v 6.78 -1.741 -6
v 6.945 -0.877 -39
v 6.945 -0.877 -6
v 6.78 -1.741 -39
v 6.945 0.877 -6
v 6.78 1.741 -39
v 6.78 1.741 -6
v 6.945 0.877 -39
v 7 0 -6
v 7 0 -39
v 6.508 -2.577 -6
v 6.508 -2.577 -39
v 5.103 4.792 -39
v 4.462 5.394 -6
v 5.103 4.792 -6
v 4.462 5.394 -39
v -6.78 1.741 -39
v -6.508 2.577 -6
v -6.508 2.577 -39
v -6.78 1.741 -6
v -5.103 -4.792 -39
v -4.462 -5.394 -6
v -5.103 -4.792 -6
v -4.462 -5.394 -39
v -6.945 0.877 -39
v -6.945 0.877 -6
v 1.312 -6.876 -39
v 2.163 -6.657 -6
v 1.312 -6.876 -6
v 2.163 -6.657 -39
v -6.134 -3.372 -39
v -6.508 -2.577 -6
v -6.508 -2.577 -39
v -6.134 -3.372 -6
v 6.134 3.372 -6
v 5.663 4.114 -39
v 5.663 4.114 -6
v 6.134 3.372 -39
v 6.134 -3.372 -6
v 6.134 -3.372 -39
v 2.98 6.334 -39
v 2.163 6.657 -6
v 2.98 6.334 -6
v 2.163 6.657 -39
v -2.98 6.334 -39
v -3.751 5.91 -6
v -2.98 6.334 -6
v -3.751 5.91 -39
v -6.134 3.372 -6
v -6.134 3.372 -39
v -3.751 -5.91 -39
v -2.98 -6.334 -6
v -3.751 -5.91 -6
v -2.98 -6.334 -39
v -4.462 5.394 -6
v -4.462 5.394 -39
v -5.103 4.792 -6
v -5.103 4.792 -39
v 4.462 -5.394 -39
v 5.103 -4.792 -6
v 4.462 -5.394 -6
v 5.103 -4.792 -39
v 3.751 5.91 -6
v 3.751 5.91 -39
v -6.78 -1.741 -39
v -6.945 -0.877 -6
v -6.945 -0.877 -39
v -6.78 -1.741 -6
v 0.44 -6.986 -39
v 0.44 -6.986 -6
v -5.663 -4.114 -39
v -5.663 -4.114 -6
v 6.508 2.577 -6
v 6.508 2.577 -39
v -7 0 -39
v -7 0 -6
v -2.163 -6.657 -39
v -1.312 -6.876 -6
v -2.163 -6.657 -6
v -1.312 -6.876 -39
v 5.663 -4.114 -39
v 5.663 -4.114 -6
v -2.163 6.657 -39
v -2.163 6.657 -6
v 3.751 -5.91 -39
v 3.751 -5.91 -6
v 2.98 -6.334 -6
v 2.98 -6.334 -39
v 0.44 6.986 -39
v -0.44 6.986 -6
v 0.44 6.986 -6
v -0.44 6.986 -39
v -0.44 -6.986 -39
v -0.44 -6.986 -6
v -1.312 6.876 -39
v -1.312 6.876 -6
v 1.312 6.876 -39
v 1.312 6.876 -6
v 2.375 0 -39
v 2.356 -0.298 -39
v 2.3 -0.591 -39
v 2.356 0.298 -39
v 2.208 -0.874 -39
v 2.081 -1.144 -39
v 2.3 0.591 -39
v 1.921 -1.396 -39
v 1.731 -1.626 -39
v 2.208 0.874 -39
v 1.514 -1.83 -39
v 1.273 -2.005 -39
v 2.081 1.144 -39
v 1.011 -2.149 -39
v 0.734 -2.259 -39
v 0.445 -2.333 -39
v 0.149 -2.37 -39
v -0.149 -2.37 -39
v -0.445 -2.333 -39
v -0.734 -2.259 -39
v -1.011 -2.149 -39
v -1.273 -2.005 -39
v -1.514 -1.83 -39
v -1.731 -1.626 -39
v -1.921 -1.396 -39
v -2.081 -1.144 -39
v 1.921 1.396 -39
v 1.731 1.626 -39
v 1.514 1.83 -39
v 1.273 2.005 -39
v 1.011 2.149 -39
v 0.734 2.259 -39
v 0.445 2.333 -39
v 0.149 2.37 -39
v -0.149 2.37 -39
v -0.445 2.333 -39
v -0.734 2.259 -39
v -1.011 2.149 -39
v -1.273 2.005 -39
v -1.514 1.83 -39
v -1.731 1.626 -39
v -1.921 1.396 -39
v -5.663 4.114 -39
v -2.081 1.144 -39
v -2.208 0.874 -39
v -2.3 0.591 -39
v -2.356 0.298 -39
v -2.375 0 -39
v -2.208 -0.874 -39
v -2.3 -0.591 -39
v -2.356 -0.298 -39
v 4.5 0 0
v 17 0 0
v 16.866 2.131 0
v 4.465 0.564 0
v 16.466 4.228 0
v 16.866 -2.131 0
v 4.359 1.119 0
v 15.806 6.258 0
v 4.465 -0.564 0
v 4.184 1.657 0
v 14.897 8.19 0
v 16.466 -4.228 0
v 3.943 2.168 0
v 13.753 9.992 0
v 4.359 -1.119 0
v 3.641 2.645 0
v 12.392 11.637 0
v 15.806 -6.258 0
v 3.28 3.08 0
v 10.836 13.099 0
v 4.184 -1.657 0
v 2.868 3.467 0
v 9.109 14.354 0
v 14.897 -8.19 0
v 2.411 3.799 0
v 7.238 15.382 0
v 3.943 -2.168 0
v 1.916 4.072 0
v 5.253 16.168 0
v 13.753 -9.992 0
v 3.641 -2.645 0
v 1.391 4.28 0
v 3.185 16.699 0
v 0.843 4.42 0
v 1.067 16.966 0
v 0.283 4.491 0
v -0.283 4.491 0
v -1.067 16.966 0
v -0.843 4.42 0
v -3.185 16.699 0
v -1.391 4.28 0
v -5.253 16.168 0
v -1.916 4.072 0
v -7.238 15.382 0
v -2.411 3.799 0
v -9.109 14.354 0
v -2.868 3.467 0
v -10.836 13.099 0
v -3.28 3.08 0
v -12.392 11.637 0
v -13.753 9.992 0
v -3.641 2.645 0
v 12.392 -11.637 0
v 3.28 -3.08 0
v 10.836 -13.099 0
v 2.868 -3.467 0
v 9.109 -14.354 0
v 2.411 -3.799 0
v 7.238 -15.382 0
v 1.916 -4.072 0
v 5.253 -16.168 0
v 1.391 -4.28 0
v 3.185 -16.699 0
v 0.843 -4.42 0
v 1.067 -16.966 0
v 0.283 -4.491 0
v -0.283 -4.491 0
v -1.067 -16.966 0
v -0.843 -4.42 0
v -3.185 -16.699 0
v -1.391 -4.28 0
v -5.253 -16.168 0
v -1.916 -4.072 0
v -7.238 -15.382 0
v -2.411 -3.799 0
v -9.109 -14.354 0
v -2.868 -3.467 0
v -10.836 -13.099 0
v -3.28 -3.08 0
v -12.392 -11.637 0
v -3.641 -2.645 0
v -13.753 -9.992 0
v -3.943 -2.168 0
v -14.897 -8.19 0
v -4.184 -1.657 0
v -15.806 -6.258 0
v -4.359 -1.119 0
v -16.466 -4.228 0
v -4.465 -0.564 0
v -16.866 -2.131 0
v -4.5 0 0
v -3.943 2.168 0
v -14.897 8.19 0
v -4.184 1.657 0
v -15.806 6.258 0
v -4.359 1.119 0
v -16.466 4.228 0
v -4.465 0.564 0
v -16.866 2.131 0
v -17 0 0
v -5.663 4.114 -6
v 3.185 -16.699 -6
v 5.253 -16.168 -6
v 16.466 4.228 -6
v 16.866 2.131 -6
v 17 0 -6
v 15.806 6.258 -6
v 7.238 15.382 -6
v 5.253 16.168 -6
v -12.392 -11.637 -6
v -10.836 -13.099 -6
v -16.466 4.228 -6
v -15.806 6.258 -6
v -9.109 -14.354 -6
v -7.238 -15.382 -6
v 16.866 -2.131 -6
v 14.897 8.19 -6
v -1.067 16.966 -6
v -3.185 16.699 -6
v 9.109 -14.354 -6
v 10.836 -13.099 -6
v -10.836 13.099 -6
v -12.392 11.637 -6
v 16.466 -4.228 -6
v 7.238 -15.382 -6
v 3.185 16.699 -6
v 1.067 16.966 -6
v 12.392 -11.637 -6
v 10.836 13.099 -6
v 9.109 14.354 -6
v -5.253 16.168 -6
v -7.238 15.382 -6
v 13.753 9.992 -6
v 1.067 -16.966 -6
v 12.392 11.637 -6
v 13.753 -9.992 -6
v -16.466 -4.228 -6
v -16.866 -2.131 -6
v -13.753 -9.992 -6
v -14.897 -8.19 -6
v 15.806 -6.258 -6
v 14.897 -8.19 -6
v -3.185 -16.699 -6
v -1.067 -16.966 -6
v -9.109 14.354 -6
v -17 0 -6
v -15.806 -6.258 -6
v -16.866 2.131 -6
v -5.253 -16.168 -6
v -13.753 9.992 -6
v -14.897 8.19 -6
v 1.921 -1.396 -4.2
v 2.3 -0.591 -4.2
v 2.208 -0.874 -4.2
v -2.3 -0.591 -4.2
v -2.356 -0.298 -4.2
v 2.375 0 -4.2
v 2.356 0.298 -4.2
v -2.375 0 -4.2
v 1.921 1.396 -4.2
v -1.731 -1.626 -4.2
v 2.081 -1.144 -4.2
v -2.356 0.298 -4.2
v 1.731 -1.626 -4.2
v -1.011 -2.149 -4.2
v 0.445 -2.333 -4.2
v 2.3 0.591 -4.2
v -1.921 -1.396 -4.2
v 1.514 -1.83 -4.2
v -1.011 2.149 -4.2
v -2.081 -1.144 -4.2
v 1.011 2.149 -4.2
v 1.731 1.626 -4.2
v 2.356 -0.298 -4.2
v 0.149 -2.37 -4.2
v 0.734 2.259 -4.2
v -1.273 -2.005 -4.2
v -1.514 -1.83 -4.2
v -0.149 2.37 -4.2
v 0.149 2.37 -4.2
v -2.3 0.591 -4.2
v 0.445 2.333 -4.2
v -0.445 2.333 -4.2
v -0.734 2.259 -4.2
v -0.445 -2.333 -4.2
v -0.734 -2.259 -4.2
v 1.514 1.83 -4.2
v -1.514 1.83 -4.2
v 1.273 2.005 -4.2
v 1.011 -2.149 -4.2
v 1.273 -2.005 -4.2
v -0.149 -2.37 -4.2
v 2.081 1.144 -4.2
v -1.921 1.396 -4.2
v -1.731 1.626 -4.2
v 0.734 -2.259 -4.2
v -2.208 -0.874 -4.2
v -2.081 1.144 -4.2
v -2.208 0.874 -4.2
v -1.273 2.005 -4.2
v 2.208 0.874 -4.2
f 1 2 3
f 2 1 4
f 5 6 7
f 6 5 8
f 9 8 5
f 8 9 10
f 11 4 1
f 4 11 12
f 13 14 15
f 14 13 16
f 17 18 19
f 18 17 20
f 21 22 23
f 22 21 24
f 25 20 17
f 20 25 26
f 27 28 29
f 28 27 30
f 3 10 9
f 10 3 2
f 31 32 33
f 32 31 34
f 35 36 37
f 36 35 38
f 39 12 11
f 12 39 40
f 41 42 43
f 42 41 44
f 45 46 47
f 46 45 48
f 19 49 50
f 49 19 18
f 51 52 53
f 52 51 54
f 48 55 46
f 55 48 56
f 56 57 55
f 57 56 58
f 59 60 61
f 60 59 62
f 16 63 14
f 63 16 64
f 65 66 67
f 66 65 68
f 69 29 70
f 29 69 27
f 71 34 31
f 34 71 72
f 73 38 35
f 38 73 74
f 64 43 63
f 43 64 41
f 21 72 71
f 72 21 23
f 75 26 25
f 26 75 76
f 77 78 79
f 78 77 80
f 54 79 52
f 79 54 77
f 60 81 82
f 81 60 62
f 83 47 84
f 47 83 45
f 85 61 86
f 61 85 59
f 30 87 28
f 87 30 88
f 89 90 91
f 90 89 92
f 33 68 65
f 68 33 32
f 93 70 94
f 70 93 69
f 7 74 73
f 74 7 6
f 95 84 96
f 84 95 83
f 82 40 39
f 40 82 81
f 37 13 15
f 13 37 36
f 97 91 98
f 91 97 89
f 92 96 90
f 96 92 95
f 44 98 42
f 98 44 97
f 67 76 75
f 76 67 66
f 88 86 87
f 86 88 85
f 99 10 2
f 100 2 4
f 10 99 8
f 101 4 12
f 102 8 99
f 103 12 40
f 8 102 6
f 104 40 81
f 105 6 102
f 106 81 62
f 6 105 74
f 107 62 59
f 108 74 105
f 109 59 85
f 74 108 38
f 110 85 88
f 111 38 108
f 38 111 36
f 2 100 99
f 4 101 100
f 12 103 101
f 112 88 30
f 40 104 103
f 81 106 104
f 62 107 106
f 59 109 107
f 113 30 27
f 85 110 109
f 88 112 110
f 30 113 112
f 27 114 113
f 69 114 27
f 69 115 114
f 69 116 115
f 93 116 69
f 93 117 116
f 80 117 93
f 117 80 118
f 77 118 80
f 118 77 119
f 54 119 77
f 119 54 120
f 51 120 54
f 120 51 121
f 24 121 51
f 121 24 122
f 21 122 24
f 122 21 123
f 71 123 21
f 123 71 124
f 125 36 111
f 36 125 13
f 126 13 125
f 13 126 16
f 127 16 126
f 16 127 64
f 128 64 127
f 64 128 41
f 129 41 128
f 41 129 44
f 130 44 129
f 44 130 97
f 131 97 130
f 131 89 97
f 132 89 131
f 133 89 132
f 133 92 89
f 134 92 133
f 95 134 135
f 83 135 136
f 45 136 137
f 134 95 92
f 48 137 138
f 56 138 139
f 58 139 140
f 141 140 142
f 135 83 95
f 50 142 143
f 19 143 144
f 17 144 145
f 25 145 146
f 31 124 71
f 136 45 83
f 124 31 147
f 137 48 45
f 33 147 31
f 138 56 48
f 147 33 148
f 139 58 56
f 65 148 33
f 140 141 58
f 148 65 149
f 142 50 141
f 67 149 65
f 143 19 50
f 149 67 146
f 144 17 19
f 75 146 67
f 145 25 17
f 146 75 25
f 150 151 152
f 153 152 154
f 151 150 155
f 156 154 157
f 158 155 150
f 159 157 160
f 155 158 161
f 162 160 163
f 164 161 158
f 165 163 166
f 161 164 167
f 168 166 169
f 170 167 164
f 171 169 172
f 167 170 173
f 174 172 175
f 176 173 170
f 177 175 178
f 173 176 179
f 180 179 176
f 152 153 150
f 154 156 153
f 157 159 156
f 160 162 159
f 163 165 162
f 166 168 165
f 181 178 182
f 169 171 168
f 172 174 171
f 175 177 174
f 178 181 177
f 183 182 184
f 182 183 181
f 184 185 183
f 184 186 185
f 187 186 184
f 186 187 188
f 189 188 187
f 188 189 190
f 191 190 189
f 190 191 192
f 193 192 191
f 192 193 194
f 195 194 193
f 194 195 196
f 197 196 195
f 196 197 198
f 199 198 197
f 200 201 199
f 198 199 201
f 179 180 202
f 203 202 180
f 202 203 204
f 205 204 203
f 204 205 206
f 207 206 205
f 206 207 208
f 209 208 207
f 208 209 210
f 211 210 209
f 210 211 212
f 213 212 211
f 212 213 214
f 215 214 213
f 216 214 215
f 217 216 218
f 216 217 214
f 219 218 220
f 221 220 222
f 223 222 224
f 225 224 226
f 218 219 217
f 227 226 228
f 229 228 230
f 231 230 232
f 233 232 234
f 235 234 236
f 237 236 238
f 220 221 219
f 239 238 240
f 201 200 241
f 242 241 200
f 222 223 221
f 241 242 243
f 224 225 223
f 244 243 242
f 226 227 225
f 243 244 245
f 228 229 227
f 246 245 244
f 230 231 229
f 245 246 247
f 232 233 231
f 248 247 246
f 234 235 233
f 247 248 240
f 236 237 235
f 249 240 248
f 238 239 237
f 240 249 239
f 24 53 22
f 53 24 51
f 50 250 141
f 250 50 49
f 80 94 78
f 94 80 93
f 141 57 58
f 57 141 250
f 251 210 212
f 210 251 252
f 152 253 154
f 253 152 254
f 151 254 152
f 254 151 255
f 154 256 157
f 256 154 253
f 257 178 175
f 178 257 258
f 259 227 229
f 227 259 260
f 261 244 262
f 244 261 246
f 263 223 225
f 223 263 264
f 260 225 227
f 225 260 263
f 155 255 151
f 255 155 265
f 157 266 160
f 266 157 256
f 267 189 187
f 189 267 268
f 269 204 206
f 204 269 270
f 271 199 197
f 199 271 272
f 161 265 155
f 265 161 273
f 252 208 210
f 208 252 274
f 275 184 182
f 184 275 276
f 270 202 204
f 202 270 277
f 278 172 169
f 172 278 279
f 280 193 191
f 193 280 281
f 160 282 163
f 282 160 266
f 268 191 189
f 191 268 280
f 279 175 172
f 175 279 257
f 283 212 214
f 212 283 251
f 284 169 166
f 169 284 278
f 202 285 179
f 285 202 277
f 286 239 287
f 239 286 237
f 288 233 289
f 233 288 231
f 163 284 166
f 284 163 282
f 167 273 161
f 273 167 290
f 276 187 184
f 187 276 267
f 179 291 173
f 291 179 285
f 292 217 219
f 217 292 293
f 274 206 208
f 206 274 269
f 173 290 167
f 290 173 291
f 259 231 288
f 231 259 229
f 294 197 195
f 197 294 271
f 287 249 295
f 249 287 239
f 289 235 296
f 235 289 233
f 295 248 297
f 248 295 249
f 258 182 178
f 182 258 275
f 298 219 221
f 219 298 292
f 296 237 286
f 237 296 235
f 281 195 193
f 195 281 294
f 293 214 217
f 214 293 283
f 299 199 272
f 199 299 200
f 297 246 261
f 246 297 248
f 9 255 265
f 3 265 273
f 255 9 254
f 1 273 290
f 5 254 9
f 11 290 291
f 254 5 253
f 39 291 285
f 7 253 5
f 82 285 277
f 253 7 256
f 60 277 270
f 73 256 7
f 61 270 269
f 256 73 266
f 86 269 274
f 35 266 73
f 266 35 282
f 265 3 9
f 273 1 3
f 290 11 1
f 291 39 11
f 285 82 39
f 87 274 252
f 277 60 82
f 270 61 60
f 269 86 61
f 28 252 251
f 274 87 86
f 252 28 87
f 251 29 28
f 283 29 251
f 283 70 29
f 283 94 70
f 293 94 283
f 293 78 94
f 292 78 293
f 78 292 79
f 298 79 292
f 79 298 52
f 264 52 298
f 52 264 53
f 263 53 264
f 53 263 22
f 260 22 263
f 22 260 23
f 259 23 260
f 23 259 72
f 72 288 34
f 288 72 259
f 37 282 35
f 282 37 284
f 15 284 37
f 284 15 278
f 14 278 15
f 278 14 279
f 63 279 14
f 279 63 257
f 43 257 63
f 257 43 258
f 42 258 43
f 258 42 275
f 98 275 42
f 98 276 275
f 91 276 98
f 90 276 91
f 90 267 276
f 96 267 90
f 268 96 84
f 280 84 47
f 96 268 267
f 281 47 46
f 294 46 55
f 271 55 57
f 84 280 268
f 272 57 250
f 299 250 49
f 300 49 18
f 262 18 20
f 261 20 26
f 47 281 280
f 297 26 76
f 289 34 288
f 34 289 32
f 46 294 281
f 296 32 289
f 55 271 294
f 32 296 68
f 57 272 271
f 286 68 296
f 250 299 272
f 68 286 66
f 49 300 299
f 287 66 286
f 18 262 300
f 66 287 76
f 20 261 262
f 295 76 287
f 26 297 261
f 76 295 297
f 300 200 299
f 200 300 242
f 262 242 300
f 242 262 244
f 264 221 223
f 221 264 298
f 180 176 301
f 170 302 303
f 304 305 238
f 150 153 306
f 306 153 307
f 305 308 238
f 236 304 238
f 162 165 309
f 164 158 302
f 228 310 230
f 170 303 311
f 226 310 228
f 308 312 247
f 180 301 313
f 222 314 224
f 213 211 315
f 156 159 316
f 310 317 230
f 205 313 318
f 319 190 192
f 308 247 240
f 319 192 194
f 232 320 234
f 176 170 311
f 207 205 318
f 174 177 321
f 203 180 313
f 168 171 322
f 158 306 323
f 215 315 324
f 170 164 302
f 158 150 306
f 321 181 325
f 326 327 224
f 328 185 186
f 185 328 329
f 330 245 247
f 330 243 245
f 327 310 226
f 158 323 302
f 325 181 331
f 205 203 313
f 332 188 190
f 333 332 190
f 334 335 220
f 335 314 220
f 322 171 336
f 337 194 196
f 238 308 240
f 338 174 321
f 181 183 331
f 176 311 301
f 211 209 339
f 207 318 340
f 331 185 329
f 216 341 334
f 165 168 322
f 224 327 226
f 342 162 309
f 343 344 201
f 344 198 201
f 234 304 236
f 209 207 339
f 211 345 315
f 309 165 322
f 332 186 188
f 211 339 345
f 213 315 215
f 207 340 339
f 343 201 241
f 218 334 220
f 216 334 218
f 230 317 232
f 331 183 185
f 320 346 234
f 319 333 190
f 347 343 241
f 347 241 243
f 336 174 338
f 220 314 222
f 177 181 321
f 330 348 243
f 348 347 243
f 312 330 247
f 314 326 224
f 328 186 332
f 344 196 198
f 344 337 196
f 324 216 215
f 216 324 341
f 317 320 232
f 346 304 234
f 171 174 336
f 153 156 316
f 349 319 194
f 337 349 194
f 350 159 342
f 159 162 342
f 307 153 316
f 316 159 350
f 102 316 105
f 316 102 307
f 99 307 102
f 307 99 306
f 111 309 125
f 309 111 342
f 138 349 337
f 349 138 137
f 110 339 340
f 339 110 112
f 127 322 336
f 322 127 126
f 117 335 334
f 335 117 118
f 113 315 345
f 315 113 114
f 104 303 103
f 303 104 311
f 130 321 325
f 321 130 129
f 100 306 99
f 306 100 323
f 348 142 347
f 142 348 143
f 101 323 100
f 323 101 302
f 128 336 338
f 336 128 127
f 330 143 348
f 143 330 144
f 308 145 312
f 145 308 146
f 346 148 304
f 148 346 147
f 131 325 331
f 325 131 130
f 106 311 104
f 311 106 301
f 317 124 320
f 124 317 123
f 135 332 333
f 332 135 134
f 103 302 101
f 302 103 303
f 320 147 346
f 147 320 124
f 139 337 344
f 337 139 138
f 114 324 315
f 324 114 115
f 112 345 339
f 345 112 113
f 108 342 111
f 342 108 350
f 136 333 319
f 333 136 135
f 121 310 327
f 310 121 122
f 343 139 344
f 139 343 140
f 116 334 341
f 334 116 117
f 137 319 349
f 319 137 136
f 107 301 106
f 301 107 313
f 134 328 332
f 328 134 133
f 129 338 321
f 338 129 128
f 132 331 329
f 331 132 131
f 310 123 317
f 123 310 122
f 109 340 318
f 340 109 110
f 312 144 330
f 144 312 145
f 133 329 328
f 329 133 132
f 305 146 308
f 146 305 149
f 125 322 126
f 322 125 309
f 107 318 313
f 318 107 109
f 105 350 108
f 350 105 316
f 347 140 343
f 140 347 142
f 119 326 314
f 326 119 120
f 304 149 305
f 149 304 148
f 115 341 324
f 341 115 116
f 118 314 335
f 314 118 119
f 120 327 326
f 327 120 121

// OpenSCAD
$fn = 50;


difference() {
	union() {
		translate(v = [0, 0, -39.0000000000]) {
			cylinder(h = 39, r = 7.0000000000);
		}
		translate(v = [0, 0, -6.0000000000]) {
			cylinder(h = 6, r = 17.0000000000);
		}
	}
	union() {
		translate(v = [0, 0, 0]) {
			rotate(a = [0, 0, 0]) {
				difference() {
					union() {
						#translate(v = [0, 0, -39.0000000000]) {
							cylinder(h = 39, r = 2.2500000000);
						}
						#translate(v = [0, 0, -4.2000000000]) {
							cylinder(h = 4.2000000000, r1 = 2.3750000000, r2 = 4.5000000000);
						}
						#translate(v = [0, 0, -39.0000000000]) {
							cylinder(h = 39, r = 2.3750000000);
						}
						#translate(v = [0, 0, -39.0000000000]) {
							cylinder(h = 39, r = 2.2500000000);
						}
					}
					union();
				}
			}
		}
	}
}
